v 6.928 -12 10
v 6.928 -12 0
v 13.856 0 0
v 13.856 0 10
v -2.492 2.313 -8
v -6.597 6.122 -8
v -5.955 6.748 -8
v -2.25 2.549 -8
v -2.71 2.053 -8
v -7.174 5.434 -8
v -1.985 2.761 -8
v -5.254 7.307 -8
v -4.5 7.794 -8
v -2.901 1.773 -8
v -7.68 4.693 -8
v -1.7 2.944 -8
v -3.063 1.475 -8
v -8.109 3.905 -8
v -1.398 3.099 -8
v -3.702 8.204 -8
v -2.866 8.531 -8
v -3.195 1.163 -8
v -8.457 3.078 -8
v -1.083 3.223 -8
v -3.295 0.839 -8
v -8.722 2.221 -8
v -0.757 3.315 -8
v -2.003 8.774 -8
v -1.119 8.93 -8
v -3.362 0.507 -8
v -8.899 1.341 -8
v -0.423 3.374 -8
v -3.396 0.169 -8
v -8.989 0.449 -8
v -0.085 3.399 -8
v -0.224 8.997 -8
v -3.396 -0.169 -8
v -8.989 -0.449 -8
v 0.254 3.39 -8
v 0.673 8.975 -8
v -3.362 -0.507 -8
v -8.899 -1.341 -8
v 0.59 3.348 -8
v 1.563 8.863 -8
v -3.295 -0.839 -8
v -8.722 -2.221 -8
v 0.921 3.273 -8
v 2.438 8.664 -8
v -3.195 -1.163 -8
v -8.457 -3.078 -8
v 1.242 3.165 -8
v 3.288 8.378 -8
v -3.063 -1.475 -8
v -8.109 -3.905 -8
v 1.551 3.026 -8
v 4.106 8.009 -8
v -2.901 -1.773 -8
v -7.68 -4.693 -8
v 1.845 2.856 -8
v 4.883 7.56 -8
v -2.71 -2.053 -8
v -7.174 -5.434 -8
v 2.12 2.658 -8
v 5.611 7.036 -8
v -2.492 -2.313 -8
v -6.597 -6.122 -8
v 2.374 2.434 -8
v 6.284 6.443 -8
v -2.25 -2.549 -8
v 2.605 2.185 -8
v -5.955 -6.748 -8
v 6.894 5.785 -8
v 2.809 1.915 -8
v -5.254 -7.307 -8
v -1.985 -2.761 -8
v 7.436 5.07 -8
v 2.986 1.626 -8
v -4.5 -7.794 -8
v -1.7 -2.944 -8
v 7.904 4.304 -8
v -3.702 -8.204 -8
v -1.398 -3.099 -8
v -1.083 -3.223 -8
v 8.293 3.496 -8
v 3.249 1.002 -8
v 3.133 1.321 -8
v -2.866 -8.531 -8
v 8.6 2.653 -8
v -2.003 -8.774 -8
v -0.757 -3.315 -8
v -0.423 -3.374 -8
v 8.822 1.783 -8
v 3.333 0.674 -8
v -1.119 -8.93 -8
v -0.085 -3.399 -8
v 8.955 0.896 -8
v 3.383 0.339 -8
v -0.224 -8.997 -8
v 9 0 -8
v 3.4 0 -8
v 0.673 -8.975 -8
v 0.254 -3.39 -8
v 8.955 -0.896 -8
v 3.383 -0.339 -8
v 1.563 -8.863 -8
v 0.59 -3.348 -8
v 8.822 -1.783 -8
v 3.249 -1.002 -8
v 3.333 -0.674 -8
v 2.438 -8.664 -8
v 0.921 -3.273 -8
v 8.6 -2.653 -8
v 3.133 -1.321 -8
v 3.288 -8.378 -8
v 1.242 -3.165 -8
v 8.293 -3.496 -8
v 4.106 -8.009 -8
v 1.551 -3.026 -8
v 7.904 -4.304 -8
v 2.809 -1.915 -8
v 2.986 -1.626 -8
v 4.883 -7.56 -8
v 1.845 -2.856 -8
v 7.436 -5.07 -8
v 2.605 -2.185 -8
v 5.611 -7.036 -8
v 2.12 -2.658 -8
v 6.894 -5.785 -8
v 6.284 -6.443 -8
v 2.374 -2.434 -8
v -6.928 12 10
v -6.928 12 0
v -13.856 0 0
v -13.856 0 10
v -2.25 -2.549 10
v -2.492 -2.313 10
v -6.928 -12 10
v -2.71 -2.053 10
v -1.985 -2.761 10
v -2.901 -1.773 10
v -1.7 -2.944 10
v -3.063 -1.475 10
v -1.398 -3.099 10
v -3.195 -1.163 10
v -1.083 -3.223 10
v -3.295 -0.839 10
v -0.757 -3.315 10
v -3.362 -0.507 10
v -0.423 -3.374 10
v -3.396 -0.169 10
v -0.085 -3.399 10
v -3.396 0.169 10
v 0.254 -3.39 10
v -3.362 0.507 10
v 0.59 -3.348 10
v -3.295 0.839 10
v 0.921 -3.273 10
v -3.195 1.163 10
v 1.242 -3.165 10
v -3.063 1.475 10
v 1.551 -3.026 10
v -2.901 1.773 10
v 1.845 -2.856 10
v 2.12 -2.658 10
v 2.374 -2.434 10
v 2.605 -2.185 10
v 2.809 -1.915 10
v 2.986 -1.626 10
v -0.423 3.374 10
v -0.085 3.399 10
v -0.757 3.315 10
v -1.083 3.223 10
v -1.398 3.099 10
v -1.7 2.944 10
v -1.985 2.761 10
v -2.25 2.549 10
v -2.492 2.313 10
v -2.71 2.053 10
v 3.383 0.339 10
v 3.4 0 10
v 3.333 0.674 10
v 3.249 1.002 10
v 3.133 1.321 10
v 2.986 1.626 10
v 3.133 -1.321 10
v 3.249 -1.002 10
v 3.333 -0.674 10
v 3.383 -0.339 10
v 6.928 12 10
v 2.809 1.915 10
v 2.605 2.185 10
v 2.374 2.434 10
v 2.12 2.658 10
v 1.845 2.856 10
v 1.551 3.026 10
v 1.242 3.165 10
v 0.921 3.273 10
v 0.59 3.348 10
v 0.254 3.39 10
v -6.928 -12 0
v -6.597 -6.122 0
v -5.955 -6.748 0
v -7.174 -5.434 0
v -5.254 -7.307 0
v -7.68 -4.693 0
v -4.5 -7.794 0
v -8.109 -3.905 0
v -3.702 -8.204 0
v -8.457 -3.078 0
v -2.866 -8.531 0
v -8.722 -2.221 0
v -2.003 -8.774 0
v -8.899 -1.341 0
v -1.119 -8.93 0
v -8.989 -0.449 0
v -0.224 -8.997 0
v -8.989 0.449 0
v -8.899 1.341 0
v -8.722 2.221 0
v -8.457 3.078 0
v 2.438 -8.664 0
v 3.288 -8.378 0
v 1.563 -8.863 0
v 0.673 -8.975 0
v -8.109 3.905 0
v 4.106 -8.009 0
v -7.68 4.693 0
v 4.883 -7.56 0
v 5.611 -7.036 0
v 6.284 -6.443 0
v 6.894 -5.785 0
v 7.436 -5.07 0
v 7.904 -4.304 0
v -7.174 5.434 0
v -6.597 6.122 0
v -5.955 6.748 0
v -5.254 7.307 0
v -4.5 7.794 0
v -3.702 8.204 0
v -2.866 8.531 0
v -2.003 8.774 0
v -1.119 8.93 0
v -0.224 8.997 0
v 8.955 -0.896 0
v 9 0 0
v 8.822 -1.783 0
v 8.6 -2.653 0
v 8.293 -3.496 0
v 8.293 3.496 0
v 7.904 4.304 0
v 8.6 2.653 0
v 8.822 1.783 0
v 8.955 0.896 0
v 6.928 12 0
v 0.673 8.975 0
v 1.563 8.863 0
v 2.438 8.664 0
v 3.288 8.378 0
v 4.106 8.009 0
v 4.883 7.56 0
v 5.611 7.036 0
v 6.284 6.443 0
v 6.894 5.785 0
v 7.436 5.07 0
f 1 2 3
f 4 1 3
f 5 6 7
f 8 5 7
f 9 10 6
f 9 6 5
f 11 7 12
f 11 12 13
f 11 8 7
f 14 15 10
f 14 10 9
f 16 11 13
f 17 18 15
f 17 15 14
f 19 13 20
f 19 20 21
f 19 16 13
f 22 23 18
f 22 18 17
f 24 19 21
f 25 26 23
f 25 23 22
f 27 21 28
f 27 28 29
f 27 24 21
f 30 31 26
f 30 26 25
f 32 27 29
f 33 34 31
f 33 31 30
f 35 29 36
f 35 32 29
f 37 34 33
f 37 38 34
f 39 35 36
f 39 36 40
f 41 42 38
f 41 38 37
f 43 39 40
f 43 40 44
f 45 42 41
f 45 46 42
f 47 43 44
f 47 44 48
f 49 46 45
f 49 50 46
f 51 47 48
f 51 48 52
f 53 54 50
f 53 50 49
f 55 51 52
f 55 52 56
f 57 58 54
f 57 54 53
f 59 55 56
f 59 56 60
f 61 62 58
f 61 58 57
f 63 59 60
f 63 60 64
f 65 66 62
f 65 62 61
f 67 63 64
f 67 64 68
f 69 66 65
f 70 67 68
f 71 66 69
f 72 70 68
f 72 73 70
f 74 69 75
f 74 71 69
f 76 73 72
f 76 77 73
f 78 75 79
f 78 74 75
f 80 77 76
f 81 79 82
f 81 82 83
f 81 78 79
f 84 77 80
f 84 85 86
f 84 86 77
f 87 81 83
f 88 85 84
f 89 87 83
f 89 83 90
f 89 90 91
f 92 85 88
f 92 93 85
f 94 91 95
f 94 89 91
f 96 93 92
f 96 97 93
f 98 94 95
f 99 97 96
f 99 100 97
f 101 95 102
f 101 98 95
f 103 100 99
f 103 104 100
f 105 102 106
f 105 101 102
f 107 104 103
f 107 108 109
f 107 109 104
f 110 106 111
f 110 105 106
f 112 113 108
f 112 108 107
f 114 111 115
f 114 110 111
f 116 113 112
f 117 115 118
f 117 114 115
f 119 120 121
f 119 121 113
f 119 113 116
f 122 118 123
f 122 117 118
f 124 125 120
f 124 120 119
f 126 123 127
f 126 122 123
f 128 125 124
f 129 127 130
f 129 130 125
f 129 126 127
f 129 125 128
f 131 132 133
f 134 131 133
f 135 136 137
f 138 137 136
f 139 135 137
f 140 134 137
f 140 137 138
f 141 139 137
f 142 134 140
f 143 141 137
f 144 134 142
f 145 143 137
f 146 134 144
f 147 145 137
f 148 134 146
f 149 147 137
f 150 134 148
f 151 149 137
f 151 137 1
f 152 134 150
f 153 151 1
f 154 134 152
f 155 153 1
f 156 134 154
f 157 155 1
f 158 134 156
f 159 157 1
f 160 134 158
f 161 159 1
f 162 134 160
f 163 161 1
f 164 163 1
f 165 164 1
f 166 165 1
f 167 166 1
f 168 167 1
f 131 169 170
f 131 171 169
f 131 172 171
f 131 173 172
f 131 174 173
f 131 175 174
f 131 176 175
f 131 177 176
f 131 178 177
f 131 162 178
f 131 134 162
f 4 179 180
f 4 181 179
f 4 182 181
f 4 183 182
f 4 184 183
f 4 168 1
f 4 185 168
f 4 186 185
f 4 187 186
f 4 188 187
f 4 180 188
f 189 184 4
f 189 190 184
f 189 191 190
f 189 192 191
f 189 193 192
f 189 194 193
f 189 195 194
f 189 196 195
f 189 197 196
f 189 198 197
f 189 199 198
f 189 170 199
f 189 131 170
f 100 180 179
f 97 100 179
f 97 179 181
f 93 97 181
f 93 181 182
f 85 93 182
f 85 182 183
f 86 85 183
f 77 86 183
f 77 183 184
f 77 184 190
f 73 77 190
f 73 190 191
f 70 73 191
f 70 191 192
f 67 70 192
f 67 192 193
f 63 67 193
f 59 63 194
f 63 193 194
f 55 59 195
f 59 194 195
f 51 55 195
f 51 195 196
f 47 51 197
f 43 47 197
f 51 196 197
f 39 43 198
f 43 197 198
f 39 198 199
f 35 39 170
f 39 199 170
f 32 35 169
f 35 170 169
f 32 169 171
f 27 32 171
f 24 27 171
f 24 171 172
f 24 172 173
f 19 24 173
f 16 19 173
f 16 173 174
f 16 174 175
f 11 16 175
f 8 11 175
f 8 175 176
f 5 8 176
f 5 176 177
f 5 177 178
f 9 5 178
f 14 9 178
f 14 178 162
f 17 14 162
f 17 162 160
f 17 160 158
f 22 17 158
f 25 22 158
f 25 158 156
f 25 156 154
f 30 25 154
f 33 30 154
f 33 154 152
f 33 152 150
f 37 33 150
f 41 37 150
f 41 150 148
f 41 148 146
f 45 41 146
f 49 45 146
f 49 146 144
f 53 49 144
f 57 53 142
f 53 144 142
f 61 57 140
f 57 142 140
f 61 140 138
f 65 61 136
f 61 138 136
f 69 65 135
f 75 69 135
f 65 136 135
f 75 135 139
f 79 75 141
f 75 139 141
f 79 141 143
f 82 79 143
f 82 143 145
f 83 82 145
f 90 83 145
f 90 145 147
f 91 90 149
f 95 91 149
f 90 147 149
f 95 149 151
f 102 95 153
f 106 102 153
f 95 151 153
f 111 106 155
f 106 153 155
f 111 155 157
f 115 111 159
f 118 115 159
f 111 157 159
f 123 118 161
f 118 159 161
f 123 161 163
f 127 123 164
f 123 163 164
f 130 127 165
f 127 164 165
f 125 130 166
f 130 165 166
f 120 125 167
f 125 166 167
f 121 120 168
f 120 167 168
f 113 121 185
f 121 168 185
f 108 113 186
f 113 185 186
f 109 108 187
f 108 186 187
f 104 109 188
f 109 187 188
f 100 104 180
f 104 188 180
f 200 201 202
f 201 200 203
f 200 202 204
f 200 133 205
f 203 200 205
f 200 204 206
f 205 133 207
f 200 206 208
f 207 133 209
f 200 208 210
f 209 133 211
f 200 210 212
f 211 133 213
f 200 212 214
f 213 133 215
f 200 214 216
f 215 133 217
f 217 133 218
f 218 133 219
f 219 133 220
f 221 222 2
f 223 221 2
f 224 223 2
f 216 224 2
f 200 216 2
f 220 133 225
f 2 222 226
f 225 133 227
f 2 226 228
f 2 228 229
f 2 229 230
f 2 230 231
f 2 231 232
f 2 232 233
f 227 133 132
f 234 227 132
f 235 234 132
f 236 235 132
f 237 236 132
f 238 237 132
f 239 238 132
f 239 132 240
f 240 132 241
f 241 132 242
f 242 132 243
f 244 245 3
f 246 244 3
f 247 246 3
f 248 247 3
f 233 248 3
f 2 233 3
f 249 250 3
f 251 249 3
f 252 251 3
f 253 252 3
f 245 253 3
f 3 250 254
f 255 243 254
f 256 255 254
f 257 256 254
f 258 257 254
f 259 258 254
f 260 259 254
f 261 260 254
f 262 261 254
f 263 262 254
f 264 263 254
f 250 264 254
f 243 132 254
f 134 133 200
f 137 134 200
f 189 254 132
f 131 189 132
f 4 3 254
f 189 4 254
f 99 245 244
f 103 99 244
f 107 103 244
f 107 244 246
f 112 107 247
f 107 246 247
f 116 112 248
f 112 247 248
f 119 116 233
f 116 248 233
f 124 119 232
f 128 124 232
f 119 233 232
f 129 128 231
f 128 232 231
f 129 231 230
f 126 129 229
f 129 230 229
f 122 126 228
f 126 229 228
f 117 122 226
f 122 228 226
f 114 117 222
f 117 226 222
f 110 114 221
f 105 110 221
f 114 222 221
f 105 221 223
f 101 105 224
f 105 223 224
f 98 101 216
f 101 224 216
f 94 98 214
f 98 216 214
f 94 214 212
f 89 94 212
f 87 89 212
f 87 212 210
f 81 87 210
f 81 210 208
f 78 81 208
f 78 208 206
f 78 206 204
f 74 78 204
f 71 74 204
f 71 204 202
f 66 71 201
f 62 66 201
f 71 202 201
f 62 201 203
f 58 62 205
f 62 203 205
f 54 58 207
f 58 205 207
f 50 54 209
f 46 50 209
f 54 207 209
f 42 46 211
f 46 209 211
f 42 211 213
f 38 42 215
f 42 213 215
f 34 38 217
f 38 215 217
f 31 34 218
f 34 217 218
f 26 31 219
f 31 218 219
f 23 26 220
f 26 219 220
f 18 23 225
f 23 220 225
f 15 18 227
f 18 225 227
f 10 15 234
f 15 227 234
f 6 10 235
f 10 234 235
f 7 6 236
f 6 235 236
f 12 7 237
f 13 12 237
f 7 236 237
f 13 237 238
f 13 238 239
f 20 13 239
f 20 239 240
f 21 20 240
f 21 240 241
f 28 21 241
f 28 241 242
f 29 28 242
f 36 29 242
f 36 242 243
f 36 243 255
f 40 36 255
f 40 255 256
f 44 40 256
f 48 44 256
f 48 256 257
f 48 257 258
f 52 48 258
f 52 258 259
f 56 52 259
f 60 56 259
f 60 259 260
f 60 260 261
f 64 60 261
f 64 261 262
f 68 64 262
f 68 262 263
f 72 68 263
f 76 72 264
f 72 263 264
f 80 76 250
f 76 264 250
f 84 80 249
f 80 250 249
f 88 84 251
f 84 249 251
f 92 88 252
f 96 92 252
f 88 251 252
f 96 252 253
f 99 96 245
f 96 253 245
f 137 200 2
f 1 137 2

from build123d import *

# Parameters (mm, degrees)
F1_DEPTH = 10
F2_R     = 9
F3_DEPTH = 8
F4_R     = 3.4
F5_DEPTH = 25


with BuildPart() as f1:
    # F0 (on Top) → F1 (new body)
    with BuildSketch(Plane.XY):
        Polygon((6.928203, 12), (-6.928203, 12), (-13.856406, 0), (-6.928203, -12), (6.928203, -12), (13.856406, 0), align=None)
    extrude(amount=F1_DEPTH)

    # F2 (on face) → F3 (join)
    with BuildSketch(Plane(origin=(0, 0, 0), x_dir=(1, 0, 0), z_dir=(0, 0, -1))):
        Circle(F2_R)
    extrude(amount=F3_DEPTH)

    # F4 (on face) → F5 (cut)
    with BuildSketch(Plane.XY.offset(10)):
        Circle(F4_R)
    extrude(amount=-F5_DEPTH, mode=Mode.SUBTRACT)


solid = f1.part
